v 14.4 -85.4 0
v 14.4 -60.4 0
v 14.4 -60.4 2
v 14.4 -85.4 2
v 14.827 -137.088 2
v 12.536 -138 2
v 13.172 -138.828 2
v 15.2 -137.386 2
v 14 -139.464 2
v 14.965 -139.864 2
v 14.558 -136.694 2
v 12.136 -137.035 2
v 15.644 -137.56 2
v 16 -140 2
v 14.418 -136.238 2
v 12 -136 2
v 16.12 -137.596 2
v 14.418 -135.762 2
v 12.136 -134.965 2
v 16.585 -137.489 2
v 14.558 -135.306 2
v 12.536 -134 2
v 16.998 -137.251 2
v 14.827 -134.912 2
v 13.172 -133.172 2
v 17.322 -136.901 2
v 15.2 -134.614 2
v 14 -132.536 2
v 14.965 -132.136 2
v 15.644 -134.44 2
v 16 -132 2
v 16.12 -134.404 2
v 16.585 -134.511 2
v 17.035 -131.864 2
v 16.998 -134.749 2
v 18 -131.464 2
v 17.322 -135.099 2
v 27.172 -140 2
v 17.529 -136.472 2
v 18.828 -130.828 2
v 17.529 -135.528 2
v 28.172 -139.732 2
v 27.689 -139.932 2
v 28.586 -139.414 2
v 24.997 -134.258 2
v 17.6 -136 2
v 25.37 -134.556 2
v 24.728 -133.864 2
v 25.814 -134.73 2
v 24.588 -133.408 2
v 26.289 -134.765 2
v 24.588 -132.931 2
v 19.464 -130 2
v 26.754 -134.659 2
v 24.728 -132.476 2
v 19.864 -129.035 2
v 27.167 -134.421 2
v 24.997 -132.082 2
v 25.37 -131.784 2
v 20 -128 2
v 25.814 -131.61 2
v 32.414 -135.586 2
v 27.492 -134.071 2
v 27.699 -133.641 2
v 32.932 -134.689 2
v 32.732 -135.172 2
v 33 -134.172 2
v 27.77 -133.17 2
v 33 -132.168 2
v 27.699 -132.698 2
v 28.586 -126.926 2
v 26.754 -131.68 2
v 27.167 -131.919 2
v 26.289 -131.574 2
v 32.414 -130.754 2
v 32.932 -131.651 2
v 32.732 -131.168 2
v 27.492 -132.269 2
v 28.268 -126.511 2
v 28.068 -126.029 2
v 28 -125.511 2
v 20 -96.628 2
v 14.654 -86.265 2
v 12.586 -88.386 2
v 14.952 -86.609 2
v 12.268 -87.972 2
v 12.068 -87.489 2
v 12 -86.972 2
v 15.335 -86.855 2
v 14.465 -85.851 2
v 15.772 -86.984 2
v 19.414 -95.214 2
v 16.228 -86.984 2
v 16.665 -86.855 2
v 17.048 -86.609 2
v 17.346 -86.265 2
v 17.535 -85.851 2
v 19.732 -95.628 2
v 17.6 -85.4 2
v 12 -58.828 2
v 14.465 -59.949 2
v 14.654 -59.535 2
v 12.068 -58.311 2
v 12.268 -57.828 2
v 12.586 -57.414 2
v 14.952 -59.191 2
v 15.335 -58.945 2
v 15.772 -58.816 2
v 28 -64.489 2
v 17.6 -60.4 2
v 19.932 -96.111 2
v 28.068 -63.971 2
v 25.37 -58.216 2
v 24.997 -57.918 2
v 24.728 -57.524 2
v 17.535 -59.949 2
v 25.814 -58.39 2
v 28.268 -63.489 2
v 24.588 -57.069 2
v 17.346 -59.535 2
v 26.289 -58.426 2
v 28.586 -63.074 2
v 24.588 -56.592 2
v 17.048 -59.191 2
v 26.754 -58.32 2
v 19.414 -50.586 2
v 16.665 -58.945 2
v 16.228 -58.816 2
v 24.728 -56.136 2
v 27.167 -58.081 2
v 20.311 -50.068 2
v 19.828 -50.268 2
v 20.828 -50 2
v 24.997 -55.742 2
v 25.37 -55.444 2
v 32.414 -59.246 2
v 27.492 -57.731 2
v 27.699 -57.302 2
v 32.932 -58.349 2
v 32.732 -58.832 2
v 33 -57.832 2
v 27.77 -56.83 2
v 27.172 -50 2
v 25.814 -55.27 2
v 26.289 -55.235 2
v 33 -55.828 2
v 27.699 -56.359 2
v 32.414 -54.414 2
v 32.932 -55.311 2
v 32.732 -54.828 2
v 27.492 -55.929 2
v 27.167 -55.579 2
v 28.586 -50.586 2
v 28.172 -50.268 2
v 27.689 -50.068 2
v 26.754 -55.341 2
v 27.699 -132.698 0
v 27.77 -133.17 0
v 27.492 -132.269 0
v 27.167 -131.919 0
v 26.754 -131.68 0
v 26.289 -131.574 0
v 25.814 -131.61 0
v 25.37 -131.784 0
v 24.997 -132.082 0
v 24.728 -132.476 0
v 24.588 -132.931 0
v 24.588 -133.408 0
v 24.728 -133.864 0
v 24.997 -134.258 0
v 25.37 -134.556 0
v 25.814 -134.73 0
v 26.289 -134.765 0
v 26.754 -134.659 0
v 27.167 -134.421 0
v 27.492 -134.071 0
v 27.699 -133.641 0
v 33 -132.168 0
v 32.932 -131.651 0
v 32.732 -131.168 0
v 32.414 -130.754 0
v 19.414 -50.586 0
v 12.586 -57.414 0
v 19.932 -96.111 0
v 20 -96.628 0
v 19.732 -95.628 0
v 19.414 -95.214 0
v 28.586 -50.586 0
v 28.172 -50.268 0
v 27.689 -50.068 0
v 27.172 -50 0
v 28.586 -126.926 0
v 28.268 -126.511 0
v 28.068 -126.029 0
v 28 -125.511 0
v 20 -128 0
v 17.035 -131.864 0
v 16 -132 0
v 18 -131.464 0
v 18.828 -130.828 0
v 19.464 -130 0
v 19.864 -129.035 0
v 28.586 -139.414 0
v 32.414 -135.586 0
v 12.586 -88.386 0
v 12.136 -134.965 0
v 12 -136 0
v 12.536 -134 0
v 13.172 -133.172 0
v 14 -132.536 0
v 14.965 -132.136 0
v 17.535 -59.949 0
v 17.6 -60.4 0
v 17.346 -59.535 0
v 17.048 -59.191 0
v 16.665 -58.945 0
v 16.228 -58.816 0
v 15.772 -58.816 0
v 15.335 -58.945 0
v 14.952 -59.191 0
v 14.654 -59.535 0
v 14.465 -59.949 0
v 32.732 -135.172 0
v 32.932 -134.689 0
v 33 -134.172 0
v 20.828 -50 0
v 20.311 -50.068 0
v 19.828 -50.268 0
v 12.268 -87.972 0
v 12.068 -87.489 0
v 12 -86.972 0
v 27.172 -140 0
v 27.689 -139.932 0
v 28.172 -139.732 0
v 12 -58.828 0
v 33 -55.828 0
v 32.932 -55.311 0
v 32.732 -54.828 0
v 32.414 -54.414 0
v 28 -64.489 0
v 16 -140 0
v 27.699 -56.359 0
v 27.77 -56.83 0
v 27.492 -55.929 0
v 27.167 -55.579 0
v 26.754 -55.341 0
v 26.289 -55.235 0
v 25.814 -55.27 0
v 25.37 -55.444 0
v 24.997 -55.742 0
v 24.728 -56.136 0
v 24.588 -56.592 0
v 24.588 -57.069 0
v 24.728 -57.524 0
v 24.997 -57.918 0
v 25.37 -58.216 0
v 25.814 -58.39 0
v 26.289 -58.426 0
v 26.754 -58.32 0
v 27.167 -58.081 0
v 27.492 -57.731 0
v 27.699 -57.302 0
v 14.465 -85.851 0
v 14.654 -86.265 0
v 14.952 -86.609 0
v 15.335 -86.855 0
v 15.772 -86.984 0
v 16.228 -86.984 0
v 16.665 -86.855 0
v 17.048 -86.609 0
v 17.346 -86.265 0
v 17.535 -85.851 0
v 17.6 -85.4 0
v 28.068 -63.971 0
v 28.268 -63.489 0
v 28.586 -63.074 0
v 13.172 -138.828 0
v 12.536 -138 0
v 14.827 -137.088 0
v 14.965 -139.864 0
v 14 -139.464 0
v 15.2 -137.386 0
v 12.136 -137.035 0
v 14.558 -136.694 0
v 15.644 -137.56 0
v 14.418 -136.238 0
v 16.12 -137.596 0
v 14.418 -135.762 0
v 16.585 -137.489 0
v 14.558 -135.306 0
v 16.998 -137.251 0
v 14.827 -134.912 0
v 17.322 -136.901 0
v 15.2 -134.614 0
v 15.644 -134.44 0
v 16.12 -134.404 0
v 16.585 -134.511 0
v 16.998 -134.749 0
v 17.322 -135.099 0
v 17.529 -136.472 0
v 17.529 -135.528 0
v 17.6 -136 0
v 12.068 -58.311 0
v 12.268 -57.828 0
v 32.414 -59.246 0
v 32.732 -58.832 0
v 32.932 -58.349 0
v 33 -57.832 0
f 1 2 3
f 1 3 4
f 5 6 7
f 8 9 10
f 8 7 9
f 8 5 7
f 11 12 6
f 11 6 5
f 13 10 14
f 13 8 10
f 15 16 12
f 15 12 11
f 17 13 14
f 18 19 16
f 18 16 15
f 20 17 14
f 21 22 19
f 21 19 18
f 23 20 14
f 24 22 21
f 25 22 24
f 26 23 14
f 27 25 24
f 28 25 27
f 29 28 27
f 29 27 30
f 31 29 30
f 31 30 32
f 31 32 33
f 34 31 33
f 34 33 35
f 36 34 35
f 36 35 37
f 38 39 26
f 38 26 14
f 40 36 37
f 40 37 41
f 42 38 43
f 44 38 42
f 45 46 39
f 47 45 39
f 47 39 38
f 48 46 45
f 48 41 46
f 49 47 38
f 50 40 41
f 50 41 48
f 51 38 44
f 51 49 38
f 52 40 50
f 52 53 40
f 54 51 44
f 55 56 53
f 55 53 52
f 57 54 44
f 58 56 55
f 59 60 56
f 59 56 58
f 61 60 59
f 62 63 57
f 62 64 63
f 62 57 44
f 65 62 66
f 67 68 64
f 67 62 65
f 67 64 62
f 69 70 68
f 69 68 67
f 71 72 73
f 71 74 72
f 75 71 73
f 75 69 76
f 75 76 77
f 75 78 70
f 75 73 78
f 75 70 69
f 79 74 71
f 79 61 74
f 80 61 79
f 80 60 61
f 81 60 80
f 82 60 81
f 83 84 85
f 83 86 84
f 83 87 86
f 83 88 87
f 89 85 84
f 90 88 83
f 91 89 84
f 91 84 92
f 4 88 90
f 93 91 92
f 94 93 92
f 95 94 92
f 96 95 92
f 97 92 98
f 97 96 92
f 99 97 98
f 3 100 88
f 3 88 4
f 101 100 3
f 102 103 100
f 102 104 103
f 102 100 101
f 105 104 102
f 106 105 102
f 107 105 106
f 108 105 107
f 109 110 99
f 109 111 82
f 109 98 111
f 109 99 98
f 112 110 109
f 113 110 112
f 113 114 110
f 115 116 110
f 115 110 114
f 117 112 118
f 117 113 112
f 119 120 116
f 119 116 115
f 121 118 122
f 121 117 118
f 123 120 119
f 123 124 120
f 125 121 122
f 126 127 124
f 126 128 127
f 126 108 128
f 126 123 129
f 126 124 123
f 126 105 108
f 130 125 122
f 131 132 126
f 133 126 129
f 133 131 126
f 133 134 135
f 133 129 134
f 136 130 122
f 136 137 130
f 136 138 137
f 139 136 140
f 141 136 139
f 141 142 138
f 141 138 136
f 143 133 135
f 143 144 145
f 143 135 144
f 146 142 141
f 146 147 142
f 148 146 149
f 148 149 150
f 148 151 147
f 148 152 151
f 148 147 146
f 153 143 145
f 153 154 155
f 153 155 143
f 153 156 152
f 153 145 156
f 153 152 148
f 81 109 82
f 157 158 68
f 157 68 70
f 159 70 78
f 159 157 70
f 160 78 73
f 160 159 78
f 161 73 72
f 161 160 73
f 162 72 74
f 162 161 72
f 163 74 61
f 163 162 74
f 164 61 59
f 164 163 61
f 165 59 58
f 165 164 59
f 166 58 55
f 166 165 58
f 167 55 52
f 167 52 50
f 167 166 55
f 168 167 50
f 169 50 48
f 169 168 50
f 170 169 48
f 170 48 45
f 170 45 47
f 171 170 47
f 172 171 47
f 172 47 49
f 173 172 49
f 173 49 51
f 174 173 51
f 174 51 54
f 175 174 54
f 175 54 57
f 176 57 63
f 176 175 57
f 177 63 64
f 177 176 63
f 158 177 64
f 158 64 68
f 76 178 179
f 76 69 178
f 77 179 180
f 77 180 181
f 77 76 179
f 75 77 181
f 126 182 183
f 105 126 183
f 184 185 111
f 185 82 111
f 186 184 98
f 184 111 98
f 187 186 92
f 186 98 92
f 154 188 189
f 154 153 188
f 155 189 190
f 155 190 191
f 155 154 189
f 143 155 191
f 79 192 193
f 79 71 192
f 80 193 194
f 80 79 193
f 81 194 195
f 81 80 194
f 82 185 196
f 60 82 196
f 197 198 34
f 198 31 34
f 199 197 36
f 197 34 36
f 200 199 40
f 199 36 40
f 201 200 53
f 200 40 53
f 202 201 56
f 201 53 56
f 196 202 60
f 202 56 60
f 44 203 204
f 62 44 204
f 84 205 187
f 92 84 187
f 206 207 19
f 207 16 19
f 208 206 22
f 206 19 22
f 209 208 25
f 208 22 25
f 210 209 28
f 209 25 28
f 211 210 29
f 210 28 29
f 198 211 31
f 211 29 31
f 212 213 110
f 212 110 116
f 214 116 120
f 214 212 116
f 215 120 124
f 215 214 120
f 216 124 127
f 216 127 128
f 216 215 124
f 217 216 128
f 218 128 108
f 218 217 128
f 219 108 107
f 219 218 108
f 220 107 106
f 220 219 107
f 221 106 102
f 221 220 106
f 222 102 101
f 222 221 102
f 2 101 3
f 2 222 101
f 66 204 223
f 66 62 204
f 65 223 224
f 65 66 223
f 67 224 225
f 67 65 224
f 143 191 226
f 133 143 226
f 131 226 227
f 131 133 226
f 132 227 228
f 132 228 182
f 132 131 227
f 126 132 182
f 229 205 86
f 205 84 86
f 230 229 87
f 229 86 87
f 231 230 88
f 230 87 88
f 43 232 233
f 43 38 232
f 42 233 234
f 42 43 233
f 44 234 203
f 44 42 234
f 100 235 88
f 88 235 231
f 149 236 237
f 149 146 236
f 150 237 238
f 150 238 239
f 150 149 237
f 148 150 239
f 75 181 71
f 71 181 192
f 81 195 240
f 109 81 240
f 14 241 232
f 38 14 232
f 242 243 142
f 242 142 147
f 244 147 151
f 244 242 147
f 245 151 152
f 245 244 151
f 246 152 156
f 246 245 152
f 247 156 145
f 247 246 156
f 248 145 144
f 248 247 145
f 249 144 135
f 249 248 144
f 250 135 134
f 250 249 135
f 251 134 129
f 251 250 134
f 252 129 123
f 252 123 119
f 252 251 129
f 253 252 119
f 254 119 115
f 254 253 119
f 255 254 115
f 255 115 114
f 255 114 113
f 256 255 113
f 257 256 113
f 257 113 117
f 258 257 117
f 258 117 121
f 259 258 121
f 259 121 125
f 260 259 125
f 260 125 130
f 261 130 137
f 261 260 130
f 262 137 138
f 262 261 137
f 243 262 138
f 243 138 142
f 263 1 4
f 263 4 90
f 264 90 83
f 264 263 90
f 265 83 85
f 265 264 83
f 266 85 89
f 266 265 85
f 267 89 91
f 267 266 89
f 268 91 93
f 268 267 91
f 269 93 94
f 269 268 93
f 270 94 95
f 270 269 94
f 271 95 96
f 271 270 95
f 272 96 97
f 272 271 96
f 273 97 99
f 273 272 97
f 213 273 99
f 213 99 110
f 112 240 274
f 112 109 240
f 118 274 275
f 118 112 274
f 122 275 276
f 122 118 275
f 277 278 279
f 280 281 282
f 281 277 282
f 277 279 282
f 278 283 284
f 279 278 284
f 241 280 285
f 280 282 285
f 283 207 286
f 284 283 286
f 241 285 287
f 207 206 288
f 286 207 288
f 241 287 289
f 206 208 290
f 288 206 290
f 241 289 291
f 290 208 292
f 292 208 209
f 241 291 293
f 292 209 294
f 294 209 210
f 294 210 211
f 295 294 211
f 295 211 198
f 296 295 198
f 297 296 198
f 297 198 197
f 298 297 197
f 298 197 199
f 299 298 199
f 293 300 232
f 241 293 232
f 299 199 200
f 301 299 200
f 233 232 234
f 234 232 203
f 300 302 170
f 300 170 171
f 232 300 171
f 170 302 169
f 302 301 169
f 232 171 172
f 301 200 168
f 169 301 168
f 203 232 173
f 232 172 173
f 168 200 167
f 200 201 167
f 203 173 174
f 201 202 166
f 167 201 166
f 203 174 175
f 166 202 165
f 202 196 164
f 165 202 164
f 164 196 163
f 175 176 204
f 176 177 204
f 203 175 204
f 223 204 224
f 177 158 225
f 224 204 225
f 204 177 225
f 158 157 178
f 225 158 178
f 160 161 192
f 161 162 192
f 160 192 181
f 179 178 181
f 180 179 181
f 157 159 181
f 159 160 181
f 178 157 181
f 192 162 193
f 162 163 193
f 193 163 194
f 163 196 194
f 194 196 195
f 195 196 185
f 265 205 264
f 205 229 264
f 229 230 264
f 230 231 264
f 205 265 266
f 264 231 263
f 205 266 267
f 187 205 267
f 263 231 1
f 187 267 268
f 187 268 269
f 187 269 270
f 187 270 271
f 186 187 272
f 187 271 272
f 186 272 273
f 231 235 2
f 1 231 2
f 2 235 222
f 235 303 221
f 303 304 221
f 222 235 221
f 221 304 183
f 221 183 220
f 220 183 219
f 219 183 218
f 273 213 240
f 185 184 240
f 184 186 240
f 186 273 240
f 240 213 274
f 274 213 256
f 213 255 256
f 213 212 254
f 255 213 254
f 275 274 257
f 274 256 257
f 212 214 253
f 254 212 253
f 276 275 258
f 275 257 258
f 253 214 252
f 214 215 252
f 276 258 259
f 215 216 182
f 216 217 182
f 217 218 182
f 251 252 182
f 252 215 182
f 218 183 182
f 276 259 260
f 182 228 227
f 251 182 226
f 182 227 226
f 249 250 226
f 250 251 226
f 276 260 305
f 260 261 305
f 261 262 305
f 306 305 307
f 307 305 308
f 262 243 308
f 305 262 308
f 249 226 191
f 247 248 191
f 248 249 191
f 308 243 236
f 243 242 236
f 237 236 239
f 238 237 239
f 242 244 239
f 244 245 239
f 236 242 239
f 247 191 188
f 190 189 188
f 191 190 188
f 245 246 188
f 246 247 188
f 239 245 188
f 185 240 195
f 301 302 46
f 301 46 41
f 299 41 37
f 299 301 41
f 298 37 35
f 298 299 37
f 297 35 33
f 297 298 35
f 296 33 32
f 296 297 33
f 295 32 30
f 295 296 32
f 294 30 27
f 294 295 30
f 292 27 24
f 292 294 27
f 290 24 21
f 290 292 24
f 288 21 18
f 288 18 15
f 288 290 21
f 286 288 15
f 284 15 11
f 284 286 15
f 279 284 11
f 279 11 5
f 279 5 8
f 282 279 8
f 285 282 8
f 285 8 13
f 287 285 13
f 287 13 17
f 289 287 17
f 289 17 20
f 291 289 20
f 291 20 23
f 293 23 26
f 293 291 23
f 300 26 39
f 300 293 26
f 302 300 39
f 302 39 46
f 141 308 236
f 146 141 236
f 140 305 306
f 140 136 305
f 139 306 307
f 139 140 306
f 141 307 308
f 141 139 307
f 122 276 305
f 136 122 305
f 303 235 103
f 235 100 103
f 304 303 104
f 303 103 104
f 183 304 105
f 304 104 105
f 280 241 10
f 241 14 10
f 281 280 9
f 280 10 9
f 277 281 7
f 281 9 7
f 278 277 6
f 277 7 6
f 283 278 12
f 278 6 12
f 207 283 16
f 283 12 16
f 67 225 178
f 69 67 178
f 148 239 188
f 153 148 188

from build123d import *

# Parameters (mm, degrees)
SKETCH1_R           = 1.6
BOSS_EXTRUDE1_DEPTH = 2
FILLET1_R           = 4
FILLET2_R           = 2


with BuildPart() as part:
    # Sketch1 → Boss-Extrude1 (new body)
    with BuildSketch(Plane.XY):
        Polygon((28, -126.339745962), (28, -63.660254038), (33, -58.660254038), (33, -55), (28, -50), (20, -50), (12, -58), (12, -87.8), (20, -95.8), (20, -132), (12, -132), (12, -140), (28, -140), (33, -135), (33, -131.339745962), align=None)
        with Locations((26.169872981, -133.169872981)):
            Circle(SKETCH1_R, mode=Mode.SUBTRACT)
        with Locations((26.169872981, -56.830127019)):
            Circle(SKETCH1_R, mode=Mode.SUBTRACT)
        with Locations((16, -136)):
            Circle(SKETCH1_R, mode=Mode.SUBTRACT)
        with BuildLine():
            Line((17.6, -85.4), (17.6, -60.4))
            ThreePointArc((17.6, -60.4), (16, -58.8), (14.4, -60.4))
            Line((14.4, -60.4), (14.4, -85.4))
            ThreePointArc((14.4, -85.4), (16, -87), (17.6, -85.4))
        make_face(mode=Mode.SUBTRACT)
    extrude(amount=BOSS_EXTRUDE1_DEPTH)

    # Fillet1
    fillet1_edges = [part.edges().sort_by_distance(p)[0] for p in [
        (12, -140, 1),
        (20, -132, 1),
        (12, -132, 1),
    ]]
    fillet(fillet1_edges, radius=FILLET1_R - 0.0001)  # a hair under: the kernel refuses the full size

    # Fillet2
    fillet2_edges = [part.edges().sort_by_distance(p)[0] for p in [
        (33, -131.339745962, 1),
        (33, -135, 1),
        (28, -140, 1),
        (20, -95.8, 1),
        (12, -87.8, 1),
        (12, -58, 1),
        (20, -50, 1),
        (28, -50, 1),
        (33, -55, 1),
        (33, -58.660254038, 1),
        (28, -63.660254038, 1),
        (28, -126.339745962, 1),
    ]]
    fillet(fillet2_edges, radius=FILLET2_R)


solid = part.part
